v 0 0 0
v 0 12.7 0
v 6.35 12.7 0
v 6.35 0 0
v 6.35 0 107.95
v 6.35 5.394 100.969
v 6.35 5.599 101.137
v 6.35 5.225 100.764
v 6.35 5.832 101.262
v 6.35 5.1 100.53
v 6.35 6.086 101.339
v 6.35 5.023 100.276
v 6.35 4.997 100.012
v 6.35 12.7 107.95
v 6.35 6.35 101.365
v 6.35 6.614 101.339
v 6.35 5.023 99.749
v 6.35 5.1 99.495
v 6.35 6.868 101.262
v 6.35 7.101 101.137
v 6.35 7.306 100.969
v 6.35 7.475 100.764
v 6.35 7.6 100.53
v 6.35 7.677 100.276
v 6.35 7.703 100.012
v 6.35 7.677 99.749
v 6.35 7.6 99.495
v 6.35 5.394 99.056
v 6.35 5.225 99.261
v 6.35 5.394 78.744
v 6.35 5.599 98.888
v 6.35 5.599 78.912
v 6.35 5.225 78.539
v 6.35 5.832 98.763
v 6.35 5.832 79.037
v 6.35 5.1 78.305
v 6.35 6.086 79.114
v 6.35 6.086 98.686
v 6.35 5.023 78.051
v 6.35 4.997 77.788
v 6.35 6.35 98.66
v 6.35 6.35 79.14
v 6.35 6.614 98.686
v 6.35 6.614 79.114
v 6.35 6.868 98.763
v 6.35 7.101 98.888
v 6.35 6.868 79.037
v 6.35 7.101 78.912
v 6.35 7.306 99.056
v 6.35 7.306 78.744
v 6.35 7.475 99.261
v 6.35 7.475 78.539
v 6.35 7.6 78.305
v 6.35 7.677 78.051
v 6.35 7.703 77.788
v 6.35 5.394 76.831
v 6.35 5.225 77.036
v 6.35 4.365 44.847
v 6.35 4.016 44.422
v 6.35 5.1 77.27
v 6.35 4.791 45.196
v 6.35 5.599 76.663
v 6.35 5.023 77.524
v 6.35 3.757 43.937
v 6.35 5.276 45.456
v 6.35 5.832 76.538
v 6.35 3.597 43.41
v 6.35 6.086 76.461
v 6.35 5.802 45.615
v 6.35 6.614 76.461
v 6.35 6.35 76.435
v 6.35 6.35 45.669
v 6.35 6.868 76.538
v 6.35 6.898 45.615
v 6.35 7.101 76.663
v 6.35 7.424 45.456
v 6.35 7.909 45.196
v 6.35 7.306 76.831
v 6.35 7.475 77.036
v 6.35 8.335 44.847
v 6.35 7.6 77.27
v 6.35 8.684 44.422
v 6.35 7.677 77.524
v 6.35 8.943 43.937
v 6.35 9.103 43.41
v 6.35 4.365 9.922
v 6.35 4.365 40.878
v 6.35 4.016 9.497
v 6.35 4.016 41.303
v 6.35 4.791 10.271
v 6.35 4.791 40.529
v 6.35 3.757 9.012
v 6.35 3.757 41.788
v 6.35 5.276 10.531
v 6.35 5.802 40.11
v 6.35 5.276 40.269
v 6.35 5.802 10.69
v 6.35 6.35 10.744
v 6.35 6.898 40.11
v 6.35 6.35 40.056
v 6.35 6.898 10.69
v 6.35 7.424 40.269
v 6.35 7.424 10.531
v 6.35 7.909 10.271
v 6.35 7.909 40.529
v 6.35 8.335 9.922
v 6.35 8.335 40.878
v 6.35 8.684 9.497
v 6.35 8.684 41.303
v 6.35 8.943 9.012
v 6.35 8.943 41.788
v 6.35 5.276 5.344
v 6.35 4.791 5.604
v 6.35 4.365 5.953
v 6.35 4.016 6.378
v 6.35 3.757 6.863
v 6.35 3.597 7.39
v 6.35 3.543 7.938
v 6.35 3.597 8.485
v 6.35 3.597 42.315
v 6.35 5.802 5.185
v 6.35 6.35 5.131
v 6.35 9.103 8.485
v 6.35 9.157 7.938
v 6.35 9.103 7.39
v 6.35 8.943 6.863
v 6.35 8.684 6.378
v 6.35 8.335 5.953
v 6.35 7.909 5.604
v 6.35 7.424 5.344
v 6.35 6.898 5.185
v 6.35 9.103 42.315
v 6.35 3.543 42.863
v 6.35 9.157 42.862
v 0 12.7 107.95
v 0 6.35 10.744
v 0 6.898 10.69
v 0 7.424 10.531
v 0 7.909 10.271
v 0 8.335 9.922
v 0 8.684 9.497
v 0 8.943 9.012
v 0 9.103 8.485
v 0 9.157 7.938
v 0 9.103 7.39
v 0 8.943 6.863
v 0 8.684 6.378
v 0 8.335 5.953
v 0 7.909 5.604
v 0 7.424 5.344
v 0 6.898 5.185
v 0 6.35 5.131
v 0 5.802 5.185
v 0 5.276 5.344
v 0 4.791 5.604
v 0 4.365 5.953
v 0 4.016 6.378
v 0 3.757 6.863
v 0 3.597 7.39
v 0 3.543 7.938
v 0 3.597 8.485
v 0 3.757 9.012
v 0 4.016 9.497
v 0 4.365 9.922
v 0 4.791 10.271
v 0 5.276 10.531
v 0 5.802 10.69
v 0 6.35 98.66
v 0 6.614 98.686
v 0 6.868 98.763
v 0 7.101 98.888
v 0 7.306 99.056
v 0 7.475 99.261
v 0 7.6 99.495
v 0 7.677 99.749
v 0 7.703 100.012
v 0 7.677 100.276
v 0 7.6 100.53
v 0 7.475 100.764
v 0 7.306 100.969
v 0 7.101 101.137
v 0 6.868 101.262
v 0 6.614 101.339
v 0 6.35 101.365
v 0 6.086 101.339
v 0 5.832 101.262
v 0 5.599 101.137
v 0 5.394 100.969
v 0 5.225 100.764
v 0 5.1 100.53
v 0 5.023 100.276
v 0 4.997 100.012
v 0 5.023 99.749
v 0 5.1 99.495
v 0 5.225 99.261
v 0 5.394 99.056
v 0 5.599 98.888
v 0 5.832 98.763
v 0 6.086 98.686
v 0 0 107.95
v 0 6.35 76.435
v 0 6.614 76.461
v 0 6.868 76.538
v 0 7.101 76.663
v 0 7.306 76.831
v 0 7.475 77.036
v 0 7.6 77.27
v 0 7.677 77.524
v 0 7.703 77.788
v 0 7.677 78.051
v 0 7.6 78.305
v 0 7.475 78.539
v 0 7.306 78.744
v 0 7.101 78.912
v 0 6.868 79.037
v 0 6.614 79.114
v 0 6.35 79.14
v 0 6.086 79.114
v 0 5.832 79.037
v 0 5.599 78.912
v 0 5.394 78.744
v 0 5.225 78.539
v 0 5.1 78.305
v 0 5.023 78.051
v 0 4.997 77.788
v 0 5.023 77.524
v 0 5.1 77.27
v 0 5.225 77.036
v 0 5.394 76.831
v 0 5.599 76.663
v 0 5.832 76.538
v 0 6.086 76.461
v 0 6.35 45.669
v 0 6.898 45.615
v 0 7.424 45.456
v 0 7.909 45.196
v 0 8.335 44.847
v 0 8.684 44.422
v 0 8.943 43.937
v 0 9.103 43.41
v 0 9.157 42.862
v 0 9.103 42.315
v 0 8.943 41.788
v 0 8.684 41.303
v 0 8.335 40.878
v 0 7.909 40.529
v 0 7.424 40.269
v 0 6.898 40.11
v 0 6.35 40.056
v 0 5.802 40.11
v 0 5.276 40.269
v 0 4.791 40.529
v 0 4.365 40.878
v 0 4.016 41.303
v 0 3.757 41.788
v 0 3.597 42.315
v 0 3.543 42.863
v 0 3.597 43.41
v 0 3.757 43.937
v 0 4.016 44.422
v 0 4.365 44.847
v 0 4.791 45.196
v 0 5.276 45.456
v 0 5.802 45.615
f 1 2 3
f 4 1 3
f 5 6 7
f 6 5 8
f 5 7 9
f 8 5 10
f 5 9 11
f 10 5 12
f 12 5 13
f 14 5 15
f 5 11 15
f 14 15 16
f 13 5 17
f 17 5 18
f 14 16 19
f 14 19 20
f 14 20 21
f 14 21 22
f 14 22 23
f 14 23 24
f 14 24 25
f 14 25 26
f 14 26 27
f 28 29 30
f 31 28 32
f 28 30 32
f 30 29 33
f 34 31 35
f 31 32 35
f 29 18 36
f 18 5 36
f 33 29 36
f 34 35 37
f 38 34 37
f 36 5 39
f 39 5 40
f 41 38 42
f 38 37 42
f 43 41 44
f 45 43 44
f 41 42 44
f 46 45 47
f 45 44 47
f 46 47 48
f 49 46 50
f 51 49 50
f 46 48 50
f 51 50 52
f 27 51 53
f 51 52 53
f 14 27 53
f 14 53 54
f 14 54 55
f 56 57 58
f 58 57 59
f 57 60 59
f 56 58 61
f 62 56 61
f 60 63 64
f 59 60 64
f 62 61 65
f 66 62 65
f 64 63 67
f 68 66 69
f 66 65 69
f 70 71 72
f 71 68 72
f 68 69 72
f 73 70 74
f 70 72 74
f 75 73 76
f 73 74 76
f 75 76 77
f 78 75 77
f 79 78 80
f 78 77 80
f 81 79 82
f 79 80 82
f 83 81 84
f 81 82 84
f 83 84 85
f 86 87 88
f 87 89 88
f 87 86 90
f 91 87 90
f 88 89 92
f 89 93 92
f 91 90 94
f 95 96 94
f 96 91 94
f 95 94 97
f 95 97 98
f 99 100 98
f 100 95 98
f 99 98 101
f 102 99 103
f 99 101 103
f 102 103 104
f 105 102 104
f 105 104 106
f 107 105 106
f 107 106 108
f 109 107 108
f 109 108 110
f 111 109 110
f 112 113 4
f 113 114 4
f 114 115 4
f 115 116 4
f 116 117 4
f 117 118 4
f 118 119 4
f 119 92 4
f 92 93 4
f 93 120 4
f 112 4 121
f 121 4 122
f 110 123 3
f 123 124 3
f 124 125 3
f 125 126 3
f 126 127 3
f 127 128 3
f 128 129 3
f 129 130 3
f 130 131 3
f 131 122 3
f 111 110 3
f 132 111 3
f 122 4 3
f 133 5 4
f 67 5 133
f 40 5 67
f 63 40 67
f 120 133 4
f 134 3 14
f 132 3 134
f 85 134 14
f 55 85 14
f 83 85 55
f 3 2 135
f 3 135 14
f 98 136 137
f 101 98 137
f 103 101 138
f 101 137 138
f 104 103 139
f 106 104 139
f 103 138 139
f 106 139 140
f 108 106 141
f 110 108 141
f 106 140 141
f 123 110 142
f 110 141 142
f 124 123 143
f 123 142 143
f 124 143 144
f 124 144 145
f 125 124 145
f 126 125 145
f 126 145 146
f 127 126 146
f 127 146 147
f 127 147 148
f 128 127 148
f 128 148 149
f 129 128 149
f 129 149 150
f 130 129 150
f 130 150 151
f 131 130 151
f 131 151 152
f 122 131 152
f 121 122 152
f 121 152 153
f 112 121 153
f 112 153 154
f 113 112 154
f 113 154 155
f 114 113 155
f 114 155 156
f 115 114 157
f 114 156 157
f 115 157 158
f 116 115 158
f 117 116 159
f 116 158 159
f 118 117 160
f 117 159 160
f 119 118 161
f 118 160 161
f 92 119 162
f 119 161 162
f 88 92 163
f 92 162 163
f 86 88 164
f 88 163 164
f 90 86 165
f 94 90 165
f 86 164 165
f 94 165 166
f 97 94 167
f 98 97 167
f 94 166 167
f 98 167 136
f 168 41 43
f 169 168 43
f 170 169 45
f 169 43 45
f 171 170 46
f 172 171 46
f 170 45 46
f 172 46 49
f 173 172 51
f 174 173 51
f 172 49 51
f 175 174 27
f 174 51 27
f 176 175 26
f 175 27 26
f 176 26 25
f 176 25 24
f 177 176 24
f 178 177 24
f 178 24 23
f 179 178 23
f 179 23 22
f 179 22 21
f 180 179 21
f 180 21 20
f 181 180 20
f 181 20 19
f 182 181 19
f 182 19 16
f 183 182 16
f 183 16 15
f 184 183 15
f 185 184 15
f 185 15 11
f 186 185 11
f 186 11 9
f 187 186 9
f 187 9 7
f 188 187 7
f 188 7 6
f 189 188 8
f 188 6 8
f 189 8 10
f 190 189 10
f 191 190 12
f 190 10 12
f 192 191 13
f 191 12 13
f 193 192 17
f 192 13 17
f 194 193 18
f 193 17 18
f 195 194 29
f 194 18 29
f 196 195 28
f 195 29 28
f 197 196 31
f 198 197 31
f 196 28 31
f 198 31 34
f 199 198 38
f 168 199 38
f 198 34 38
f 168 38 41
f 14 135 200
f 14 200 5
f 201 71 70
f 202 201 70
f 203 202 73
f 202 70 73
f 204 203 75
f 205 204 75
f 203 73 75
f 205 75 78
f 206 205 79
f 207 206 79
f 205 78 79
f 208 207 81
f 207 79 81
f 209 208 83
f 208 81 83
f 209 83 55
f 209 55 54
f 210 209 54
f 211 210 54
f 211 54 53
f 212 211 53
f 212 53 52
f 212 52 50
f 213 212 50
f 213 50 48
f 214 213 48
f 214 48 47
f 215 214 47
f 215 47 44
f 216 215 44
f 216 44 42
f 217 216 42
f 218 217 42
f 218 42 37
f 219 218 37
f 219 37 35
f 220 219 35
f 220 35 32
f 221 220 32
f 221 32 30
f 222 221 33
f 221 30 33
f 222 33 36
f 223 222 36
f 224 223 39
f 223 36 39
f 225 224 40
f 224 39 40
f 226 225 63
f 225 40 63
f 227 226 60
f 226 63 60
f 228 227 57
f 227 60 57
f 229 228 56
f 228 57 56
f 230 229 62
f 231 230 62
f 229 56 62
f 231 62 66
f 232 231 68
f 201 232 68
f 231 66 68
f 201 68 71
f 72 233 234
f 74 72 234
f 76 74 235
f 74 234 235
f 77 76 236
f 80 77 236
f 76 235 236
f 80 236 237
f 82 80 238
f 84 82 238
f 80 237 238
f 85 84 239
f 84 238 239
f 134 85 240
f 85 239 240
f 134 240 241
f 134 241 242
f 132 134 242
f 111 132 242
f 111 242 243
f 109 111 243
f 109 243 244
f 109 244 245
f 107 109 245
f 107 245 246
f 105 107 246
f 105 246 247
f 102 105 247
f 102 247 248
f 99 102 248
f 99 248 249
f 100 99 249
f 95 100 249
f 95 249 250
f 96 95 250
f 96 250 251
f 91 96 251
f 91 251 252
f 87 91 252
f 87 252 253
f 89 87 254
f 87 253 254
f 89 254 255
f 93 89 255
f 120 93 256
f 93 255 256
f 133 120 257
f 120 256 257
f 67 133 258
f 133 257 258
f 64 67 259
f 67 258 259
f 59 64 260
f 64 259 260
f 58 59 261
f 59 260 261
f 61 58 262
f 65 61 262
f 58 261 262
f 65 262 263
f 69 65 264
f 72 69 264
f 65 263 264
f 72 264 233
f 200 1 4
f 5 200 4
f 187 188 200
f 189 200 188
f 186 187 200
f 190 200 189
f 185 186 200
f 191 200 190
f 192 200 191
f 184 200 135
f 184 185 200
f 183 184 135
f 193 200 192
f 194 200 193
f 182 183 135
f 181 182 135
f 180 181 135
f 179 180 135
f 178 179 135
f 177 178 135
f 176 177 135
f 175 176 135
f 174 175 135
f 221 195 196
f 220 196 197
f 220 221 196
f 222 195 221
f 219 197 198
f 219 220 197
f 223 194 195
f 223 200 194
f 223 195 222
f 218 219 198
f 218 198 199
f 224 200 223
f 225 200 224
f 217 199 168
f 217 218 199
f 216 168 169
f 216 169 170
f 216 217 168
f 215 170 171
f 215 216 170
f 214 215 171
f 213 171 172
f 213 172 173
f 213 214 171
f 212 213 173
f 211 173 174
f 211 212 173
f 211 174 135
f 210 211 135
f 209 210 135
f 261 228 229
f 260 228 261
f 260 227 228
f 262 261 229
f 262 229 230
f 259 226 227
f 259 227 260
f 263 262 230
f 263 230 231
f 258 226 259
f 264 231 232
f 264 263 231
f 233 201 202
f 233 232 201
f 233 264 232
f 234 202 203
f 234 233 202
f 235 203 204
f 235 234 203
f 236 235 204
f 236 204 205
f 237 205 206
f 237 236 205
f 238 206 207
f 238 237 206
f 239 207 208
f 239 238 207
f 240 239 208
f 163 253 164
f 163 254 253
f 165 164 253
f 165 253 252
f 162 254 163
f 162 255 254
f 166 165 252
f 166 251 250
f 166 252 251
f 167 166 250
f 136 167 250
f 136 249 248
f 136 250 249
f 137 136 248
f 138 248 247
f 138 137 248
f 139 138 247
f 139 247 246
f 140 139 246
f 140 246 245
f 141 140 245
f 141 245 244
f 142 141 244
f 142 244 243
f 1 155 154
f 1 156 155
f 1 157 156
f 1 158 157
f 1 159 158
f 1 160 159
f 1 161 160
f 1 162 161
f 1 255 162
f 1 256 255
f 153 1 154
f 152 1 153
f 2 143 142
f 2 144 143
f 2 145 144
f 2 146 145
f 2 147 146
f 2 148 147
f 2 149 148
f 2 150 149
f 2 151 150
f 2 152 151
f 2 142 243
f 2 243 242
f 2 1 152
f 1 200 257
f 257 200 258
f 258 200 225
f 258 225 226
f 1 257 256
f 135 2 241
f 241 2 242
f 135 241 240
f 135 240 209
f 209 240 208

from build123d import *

# Parameters (mm, degrees)
SKETCH1_W              = 6.35
SKETCH1_H              = 12.7
EXTRUDE1_DEPTH         = 107.95
F_10_CLEARANCE_HOLE1_D = 5.6134
F_6_32_TAPPED_HOLE1_D  = 2.7051


with BuildPart() as part:
    # Sketch1 → Extrude1 (new body)
    with BuildSketch(Plane.XY):
        with Locations((3.175, 6.35)):
            Rectangle(SKETCH1_W, SKETCH1_H)
    extrude(amount=EXTRUDE1_DEPTH)

    # #10 Clearance Hole1 (through all)
    with Locations(Plane(origin=(6.35, 0, 0), x_dir=(0, 0, -1), z_dir=(1, 0, 0))):
        with Locations((-42.8625, 6.35), (-7.9375, 6.35)):
            Hole(F_10_CLEARANCE_HOLE1_D / 2)

    # #6-32 Tapped Hole1 (through all)
    with Locations(Plane.ZY):
        with Locations((100.0125, 6.35), (77.7875, 6.35)):
            Hole(F_6_32_TAPPED_HOLE1_D / 2)


solid = part.part
